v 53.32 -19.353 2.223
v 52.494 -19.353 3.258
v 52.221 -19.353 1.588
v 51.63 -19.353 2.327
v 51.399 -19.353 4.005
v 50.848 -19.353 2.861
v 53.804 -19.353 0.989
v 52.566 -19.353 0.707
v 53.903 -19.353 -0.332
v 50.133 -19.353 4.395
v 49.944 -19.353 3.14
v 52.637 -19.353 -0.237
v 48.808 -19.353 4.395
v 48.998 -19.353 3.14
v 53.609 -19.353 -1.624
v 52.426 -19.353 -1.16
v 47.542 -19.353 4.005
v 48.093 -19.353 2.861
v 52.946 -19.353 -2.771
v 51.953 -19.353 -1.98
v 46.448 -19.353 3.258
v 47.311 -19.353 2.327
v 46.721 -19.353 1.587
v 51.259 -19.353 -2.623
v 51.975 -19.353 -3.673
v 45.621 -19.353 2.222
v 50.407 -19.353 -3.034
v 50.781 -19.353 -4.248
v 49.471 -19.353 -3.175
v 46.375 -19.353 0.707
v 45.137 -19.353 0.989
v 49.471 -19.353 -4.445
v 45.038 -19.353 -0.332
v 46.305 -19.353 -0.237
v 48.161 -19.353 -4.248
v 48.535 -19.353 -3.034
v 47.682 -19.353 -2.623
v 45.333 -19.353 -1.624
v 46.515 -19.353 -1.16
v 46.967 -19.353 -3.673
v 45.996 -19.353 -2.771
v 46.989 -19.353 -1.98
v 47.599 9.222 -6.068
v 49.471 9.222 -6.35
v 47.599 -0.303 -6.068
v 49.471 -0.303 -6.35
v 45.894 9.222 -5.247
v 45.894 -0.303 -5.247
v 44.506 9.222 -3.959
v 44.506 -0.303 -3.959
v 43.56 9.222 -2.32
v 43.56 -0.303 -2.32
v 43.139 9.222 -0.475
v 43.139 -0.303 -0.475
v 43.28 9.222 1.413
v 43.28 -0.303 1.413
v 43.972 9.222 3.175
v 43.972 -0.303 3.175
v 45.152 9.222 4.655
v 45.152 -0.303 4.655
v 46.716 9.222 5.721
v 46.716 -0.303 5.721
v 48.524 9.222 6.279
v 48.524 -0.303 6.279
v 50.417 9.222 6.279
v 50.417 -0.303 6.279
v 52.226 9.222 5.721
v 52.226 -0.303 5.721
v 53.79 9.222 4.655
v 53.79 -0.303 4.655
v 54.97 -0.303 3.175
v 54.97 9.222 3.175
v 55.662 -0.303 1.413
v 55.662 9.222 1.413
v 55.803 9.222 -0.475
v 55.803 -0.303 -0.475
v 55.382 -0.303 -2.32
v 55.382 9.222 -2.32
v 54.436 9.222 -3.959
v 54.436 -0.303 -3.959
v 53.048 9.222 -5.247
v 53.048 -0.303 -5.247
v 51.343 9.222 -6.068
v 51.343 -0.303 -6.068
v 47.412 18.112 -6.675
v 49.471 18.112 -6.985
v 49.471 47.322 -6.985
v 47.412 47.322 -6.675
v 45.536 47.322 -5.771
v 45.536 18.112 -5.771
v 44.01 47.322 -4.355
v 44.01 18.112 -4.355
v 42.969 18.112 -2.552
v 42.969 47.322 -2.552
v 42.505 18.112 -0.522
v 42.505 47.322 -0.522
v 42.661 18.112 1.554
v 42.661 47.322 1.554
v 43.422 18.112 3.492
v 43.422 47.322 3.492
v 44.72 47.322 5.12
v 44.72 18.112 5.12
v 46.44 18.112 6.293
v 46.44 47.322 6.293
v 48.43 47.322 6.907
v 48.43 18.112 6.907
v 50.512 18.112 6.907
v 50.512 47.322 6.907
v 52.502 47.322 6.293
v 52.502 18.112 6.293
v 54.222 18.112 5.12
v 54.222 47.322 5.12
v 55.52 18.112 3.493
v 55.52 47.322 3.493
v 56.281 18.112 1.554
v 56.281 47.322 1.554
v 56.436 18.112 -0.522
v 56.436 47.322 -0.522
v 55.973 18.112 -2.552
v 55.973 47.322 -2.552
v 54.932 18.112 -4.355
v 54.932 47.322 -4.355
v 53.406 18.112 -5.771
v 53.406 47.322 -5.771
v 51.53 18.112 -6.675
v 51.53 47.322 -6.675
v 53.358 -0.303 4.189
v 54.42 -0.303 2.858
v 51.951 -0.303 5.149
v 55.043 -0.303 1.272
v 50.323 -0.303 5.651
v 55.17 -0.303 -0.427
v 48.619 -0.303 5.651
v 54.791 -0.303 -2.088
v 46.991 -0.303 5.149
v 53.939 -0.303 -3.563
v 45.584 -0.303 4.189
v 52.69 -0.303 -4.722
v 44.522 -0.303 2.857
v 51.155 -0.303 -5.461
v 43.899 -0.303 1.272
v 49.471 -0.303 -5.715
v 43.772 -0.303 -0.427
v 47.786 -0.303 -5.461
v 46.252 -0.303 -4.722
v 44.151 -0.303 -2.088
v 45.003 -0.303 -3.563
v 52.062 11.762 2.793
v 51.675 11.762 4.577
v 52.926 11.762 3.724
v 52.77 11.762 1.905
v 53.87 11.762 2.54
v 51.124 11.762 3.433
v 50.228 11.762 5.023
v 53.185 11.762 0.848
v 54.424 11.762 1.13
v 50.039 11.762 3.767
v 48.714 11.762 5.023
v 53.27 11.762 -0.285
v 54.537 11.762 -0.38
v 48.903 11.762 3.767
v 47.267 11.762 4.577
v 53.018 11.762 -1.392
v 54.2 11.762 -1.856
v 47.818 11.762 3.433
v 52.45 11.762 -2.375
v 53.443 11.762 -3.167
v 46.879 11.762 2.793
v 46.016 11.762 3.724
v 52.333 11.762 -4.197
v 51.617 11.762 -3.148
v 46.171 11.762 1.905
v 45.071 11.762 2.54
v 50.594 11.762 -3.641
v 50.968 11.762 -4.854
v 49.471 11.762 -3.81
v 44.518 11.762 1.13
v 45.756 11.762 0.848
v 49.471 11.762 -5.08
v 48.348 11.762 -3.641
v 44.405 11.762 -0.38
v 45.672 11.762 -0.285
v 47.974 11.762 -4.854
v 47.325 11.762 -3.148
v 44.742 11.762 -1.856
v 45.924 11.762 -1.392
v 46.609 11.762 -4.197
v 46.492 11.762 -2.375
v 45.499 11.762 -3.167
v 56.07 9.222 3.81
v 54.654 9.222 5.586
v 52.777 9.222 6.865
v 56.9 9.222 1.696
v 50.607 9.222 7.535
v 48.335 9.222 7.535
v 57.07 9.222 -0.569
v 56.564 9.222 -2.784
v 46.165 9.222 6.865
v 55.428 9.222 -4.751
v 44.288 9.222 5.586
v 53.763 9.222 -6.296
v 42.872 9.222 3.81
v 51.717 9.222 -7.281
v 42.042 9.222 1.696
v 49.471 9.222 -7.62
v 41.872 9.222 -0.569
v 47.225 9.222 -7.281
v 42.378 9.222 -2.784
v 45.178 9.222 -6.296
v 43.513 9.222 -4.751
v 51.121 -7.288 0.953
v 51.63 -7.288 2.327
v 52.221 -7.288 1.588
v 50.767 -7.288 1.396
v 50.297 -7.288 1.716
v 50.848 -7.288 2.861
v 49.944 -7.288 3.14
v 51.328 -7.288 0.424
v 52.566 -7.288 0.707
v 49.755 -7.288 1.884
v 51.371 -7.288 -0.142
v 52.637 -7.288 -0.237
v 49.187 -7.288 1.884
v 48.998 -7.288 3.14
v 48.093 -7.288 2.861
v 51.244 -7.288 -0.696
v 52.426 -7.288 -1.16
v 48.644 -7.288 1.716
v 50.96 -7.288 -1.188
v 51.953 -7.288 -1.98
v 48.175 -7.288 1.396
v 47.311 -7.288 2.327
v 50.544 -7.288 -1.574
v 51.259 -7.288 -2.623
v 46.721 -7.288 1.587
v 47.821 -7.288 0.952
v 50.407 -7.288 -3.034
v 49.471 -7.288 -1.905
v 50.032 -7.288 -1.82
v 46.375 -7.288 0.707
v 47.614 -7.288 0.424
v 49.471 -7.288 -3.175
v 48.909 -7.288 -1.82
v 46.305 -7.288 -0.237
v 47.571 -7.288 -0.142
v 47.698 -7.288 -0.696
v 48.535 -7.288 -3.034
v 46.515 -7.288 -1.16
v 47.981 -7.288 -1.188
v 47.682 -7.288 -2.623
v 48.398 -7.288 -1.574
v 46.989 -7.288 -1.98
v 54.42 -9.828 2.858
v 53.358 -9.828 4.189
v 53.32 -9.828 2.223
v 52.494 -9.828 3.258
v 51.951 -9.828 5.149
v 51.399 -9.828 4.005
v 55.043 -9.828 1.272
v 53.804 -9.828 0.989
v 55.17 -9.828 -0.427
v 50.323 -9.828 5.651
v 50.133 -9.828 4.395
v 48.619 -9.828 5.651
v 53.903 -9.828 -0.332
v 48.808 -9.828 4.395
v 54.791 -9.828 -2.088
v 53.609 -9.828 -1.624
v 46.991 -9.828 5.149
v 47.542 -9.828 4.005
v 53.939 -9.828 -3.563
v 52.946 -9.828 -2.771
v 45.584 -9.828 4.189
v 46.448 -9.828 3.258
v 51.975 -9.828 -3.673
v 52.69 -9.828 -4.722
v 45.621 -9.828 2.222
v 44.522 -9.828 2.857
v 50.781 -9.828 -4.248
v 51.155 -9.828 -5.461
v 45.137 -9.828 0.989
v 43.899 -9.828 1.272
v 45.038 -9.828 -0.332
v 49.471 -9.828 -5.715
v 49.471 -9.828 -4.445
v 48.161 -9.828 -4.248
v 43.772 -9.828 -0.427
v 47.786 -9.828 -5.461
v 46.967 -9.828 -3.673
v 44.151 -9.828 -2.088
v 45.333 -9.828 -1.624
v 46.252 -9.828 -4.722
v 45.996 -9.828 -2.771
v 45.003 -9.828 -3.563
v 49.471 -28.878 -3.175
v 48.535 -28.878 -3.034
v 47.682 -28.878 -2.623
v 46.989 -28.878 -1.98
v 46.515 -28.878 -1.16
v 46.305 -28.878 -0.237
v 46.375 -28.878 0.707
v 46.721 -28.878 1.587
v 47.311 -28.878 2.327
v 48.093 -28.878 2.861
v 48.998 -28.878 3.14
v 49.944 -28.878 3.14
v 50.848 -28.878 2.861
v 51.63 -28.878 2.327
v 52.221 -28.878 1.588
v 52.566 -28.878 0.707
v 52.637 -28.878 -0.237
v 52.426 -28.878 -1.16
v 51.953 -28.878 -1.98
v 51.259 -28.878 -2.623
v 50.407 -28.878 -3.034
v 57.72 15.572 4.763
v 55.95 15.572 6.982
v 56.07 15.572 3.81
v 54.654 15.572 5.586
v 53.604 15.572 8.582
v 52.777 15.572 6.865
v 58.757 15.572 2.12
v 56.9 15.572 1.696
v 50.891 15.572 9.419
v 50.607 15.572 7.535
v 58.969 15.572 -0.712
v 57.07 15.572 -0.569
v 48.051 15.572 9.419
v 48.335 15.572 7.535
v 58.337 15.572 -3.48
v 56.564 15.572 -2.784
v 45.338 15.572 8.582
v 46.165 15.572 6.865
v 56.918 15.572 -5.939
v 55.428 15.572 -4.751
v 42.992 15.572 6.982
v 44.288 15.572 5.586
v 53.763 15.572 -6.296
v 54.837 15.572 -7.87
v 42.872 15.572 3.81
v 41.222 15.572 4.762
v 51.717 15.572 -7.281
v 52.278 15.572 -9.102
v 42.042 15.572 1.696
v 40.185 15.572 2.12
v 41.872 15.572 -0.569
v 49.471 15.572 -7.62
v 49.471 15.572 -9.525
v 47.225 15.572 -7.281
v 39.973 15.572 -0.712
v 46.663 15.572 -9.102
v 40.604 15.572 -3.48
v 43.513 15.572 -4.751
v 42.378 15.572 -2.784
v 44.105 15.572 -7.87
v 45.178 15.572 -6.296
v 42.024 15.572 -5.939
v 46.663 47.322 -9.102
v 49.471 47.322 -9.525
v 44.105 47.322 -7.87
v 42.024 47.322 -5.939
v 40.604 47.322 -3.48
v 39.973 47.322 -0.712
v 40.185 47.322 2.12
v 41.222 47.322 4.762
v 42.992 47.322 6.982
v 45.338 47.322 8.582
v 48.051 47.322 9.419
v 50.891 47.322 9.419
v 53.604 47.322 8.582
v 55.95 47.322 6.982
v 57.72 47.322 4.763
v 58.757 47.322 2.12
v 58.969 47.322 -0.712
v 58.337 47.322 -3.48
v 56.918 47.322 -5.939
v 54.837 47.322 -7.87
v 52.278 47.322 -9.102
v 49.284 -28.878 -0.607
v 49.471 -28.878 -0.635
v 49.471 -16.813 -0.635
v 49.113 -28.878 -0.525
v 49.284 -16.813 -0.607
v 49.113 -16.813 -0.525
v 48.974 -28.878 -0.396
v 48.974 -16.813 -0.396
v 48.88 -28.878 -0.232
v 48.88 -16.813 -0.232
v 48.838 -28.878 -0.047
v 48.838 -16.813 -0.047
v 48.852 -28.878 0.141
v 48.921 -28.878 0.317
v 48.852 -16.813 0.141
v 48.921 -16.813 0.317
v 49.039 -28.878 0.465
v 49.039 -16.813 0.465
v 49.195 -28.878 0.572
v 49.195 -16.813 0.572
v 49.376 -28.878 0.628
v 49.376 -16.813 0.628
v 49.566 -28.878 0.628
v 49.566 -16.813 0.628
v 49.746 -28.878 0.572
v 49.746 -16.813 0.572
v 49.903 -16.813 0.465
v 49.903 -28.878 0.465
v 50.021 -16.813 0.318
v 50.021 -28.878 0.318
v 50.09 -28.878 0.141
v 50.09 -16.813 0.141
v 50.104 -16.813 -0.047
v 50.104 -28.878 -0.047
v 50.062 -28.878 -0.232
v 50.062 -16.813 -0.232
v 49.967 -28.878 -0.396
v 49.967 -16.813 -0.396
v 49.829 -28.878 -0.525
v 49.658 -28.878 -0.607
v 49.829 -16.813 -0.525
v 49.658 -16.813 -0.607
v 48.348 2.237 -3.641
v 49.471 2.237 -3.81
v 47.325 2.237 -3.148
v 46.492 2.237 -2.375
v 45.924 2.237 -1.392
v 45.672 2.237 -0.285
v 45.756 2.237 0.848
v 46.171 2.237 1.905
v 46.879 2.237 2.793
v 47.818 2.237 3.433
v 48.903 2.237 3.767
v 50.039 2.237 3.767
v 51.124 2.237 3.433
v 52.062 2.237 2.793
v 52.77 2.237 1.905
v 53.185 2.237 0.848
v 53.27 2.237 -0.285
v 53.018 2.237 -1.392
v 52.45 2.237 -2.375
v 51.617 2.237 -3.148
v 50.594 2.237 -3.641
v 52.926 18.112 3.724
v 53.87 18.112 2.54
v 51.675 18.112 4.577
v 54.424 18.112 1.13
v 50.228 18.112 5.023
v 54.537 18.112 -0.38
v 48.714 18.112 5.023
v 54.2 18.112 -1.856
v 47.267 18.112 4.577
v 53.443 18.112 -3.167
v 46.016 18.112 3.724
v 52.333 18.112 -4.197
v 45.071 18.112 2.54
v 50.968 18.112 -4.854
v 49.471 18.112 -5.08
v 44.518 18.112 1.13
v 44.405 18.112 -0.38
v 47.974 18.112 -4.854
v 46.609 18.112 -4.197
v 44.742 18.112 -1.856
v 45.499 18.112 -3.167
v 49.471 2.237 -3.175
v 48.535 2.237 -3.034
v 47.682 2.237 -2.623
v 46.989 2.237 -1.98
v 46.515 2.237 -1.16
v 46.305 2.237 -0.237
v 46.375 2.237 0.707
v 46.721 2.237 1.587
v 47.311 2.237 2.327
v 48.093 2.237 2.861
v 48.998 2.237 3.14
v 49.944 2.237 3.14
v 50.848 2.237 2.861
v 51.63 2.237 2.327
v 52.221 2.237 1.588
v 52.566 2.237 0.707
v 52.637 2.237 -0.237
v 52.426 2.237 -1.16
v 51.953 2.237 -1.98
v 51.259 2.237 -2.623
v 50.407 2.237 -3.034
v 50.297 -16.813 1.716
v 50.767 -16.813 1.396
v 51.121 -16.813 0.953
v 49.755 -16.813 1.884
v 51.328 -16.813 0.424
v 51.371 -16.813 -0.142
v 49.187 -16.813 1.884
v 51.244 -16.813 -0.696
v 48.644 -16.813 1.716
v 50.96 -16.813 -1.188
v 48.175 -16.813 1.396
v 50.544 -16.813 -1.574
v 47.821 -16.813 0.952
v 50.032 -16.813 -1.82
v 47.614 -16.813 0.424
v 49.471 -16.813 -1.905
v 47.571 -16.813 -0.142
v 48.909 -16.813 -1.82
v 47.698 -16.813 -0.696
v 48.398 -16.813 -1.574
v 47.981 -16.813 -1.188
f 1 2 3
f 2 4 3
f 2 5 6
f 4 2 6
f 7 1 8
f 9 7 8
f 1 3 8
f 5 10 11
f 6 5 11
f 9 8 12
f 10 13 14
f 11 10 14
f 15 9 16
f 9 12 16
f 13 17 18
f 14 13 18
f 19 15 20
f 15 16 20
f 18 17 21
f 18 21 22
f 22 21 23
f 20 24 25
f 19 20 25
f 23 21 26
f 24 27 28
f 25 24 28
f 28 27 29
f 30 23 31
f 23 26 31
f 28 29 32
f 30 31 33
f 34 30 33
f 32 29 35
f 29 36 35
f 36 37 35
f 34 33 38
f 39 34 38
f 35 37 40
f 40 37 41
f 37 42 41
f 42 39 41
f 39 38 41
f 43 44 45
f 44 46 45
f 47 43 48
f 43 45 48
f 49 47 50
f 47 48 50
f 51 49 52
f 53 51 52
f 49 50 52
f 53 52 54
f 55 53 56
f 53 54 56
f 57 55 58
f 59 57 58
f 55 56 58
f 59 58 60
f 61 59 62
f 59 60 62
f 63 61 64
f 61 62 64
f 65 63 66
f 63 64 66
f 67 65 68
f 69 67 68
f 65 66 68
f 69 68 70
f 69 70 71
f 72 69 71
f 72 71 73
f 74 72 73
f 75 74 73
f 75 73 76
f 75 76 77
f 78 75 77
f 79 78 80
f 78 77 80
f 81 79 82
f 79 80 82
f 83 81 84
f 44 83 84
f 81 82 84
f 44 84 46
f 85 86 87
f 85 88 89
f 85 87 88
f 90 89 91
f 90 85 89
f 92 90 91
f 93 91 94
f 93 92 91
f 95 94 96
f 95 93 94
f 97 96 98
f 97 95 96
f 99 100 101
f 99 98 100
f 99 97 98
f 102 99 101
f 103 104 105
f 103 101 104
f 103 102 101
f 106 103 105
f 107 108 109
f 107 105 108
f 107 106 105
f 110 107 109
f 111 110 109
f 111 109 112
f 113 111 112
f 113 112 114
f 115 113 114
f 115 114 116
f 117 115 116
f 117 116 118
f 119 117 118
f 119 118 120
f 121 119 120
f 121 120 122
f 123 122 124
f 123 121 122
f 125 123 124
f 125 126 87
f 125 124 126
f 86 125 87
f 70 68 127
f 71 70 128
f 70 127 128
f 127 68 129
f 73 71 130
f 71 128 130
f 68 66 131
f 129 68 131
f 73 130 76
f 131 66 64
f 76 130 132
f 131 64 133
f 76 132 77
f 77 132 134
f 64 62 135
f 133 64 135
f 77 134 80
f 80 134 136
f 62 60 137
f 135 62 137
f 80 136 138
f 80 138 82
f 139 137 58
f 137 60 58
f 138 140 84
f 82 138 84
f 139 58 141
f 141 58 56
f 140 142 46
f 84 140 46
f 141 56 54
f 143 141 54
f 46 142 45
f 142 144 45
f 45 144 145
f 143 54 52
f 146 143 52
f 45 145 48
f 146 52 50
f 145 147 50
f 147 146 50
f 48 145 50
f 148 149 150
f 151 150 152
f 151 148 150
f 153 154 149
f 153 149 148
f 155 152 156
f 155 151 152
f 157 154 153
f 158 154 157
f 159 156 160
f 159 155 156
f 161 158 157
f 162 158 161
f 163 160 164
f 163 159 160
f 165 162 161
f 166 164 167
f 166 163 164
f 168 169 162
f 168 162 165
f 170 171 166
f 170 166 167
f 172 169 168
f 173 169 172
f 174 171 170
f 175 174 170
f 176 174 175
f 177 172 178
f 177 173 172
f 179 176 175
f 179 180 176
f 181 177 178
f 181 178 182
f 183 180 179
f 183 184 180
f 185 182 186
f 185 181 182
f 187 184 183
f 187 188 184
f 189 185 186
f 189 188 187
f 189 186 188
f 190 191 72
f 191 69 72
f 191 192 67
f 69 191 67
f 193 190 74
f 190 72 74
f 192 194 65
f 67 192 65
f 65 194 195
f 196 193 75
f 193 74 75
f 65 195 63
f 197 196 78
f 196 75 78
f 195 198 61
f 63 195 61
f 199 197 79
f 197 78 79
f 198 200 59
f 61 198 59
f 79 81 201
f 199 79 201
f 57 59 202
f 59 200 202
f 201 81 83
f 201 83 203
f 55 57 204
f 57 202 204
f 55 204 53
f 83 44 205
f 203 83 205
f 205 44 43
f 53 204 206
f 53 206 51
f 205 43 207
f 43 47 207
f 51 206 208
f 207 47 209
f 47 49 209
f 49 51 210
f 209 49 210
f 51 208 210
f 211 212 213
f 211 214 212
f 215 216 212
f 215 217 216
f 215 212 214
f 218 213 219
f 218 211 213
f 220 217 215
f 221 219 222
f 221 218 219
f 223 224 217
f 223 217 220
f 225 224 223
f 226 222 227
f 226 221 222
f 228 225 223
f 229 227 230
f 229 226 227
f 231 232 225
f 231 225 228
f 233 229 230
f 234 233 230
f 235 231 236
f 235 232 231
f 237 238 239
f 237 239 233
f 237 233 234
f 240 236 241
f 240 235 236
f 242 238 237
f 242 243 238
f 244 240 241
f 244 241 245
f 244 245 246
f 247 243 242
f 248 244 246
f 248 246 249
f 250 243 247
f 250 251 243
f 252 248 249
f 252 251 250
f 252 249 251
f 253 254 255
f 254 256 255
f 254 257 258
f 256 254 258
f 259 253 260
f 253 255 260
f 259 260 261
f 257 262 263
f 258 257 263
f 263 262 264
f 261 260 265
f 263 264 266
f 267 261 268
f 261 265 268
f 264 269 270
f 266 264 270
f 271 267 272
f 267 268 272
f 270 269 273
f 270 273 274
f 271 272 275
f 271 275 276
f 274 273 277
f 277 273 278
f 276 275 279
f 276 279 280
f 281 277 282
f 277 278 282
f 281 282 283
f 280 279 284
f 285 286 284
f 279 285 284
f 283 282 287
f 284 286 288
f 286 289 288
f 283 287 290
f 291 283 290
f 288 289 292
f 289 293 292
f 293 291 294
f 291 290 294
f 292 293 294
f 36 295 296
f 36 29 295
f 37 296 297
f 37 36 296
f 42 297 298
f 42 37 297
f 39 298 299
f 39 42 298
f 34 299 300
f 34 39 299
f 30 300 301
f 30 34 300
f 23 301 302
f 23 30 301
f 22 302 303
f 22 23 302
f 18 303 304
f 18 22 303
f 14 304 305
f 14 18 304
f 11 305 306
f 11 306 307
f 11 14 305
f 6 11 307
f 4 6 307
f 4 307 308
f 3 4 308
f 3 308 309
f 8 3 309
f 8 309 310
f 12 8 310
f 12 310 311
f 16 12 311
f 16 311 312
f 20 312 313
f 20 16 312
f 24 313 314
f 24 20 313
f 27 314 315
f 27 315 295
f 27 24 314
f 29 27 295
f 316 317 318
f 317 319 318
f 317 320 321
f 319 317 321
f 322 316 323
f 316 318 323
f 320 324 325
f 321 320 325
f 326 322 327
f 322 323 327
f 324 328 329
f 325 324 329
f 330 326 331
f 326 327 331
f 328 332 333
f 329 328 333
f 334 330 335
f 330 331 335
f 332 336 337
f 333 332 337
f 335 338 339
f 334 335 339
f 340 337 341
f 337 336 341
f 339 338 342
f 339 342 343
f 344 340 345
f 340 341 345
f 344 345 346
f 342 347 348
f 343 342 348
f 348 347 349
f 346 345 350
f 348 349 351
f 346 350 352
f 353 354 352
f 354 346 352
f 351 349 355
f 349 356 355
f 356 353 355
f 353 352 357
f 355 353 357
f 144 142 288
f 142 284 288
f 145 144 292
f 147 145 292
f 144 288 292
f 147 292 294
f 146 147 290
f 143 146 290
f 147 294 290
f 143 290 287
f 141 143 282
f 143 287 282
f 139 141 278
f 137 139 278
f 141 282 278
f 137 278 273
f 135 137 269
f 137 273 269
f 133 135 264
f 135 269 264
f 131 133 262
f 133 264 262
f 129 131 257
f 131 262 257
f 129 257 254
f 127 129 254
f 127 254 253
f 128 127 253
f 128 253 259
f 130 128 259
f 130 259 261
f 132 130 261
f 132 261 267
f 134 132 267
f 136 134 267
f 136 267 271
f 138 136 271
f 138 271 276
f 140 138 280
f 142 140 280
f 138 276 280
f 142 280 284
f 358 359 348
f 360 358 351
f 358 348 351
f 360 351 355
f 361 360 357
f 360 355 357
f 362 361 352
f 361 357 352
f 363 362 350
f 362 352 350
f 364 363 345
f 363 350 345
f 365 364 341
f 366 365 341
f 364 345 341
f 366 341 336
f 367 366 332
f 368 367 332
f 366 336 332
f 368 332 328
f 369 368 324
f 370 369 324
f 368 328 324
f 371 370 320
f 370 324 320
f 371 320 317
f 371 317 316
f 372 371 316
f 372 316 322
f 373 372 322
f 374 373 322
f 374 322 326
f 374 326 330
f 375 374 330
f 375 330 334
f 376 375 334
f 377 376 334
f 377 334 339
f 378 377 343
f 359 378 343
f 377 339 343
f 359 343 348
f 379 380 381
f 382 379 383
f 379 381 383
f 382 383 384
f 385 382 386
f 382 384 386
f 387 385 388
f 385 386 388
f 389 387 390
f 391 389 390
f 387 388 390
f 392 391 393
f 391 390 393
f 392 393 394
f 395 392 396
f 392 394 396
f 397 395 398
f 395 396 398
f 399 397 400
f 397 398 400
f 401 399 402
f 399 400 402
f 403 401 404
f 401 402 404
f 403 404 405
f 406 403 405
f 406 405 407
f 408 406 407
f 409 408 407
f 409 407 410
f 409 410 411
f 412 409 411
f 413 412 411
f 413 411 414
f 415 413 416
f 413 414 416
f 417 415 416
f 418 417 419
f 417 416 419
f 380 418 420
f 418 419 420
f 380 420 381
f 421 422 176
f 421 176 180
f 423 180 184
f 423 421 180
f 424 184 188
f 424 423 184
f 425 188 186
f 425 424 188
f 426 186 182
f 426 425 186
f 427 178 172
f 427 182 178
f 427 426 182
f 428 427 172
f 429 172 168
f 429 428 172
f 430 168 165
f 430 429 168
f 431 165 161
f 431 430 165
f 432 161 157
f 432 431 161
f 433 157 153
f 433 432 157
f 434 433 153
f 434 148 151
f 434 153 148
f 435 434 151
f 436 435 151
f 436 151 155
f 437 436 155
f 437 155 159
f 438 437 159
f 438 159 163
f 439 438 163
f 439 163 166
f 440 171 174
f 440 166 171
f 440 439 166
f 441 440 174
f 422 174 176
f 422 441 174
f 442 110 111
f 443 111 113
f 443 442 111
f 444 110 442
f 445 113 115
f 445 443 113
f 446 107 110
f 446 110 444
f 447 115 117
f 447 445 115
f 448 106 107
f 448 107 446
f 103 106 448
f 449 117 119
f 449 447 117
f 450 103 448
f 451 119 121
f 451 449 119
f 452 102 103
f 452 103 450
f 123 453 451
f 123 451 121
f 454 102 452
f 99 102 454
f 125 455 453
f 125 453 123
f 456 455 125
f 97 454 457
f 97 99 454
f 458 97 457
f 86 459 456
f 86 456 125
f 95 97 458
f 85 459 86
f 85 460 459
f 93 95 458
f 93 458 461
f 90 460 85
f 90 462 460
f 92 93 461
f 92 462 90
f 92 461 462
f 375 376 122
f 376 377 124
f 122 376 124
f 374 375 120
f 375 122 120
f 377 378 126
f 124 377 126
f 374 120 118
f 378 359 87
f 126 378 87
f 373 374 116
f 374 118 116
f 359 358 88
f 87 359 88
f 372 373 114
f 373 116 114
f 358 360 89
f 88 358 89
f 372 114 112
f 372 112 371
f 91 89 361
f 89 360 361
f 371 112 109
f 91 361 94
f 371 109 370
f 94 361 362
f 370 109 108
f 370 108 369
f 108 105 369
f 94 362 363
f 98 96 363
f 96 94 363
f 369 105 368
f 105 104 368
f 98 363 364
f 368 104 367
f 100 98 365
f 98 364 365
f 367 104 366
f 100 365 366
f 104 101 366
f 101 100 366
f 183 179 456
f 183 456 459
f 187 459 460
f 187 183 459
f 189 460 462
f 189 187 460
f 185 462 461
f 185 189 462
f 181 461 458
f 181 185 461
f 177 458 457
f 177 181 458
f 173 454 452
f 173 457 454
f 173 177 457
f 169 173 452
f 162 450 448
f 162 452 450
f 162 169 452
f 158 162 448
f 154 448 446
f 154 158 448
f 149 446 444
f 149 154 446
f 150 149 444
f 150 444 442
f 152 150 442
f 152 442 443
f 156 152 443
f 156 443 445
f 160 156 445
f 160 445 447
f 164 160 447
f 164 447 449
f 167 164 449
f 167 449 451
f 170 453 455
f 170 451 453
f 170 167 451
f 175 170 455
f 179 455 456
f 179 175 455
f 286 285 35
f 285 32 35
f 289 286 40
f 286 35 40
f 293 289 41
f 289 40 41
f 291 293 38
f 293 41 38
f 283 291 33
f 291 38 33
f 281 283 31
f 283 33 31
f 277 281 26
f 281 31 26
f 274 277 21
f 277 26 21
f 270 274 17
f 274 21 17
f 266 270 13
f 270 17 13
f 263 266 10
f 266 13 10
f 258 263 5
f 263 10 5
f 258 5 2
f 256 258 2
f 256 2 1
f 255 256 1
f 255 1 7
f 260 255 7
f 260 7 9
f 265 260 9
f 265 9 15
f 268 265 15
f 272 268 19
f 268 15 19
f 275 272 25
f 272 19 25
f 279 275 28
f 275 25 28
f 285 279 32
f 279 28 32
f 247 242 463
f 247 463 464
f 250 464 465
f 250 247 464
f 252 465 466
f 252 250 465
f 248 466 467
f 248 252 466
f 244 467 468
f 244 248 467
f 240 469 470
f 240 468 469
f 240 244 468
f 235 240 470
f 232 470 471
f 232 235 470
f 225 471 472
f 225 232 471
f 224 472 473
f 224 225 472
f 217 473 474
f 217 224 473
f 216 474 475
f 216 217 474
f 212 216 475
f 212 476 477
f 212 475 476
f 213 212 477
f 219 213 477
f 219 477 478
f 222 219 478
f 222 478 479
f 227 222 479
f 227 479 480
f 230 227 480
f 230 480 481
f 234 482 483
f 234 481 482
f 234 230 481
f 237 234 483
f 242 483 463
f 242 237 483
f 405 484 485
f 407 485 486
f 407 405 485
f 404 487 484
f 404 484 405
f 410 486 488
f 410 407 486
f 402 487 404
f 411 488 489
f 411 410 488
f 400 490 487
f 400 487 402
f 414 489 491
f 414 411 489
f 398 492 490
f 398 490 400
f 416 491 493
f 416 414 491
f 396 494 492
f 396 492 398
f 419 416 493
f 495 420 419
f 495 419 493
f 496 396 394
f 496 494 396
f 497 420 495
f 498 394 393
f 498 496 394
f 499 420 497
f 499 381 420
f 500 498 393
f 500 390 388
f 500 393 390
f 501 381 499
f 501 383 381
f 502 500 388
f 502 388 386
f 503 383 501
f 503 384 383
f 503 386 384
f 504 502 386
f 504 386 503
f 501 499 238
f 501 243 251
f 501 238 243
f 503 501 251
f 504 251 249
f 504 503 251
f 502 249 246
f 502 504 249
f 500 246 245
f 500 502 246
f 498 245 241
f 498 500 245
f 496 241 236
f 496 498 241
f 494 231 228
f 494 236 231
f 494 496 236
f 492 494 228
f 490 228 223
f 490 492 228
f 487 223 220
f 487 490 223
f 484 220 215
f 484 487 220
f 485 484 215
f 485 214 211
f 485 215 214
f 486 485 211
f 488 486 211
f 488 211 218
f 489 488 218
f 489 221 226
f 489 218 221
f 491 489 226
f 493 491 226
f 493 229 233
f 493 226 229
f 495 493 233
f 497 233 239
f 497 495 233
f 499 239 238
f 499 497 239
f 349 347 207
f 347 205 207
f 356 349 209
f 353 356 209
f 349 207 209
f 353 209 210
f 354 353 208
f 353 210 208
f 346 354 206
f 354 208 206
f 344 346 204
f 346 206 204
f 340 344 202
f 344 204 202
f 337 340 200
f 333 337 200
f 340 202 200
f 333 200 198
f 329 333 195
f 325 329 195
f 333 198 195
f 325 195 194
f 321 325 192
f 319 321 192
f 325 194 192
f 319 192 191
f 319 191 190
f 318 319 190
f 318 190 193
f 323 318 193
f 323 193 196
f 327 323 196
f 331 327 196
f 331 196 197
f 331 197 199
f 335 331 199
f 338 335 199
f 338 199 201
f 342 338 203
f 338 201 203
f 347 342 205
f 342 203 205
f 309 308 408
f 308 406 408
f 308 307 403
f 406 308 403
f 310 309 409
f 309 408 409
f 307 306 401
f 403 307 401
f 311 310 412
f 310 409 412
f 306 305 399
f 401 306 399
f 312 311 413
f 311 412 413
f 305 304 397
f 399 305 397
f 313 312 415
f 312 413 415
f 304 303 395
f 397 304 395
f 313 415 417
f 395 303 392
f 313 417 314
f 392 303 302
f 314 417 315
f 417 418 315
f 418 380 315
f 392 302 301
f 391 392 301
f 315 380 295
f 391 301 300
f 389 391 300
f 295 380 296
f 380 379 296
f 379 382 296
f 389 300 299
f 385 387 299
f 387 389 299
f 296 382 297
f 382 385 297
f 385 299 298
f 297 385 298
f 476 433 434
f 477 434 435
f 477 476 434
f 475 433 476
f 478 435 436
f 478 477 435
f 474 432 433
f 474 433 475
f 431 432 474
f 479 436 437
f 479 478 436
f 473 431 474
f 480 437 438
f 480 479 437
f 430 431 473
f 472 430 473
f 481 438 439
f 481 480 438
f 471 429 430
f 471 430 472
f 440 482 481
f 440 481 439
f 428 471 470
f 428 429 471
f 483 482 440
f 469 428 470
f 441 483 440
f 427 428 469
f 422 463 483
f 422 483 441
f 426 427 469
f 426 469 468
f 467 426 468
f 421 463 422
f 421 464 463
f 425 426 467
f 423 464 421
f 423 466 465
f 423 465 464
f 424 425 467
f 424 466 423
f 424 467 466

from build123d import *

# Parameters (mm, degrees)
SKETCH1_W = 3.175
SKETCH1_H = 9.525
SHELL1_T  = -2.54


with BuildPart() as part:
    # Sketch1 → Revolve5 (revolve)
    with BuildSketch(Plane.XY, mode=Mode.PRIVATE) as revolve5_sk:
        Polygon((49.470878753, 15.571822686), (49.470878753, 47.321822686), (39.945878753, 47.321822686), (39.945878753, 15.571822686), (41.850878753, 15.571822686), align=None)
        Polygon((49.470878753, 9.221822686), (49.470878753, 15.571822686), (41.850878753, 15.571822686), (41.850878753, 9.221822686), (43.120878753, 9.221822686), align=None)
        Polygon((49.470878753, -0.303177314), (49.470878753, 9.221822686), (43.120878753, 9.221822686), (43.120878753, -0.303177314), (43.755878753, -0.303177314), align=None)
        Polygon((49.470878753, -9.828177314), (49.470878753, -0.303177314), (43.755878753, -0.303177314), (43.755878753, -9.828177314), (45.025878753, -9.828177314), align=None)
        Polygon((49.470878753, -19.353177314), (49.470878753, -9.828177314), (45.025878753, -9.828177314), (45.025878753, -19.353177314), (46.295878753, -19.353177314), align=None)
        with Locations((47.883378753, -24.115677314)):
            Rectangle(SKETCH1_W, SKETCH1_H)
    revolve(revolve5_sk.sketch.rotate(Axis((49.470878753, -38.227970454, 0), (0, 1, 0)), 270), axis=Axis((49.470878753, -38.227970454, 0), (0, 1, 0)))

    # Shell1
    shell1_openings = [part.faces().sort_by_distance(p)[0] for p in [
        (49.470878753, 47.321822686, 0),
        (49.470878753, -28.878177314, 0),
    ]]
    offset(amount=SHELL1_T, openings=shell1_openings, kind=Kind.INTERSECTION)


solid = part.part
